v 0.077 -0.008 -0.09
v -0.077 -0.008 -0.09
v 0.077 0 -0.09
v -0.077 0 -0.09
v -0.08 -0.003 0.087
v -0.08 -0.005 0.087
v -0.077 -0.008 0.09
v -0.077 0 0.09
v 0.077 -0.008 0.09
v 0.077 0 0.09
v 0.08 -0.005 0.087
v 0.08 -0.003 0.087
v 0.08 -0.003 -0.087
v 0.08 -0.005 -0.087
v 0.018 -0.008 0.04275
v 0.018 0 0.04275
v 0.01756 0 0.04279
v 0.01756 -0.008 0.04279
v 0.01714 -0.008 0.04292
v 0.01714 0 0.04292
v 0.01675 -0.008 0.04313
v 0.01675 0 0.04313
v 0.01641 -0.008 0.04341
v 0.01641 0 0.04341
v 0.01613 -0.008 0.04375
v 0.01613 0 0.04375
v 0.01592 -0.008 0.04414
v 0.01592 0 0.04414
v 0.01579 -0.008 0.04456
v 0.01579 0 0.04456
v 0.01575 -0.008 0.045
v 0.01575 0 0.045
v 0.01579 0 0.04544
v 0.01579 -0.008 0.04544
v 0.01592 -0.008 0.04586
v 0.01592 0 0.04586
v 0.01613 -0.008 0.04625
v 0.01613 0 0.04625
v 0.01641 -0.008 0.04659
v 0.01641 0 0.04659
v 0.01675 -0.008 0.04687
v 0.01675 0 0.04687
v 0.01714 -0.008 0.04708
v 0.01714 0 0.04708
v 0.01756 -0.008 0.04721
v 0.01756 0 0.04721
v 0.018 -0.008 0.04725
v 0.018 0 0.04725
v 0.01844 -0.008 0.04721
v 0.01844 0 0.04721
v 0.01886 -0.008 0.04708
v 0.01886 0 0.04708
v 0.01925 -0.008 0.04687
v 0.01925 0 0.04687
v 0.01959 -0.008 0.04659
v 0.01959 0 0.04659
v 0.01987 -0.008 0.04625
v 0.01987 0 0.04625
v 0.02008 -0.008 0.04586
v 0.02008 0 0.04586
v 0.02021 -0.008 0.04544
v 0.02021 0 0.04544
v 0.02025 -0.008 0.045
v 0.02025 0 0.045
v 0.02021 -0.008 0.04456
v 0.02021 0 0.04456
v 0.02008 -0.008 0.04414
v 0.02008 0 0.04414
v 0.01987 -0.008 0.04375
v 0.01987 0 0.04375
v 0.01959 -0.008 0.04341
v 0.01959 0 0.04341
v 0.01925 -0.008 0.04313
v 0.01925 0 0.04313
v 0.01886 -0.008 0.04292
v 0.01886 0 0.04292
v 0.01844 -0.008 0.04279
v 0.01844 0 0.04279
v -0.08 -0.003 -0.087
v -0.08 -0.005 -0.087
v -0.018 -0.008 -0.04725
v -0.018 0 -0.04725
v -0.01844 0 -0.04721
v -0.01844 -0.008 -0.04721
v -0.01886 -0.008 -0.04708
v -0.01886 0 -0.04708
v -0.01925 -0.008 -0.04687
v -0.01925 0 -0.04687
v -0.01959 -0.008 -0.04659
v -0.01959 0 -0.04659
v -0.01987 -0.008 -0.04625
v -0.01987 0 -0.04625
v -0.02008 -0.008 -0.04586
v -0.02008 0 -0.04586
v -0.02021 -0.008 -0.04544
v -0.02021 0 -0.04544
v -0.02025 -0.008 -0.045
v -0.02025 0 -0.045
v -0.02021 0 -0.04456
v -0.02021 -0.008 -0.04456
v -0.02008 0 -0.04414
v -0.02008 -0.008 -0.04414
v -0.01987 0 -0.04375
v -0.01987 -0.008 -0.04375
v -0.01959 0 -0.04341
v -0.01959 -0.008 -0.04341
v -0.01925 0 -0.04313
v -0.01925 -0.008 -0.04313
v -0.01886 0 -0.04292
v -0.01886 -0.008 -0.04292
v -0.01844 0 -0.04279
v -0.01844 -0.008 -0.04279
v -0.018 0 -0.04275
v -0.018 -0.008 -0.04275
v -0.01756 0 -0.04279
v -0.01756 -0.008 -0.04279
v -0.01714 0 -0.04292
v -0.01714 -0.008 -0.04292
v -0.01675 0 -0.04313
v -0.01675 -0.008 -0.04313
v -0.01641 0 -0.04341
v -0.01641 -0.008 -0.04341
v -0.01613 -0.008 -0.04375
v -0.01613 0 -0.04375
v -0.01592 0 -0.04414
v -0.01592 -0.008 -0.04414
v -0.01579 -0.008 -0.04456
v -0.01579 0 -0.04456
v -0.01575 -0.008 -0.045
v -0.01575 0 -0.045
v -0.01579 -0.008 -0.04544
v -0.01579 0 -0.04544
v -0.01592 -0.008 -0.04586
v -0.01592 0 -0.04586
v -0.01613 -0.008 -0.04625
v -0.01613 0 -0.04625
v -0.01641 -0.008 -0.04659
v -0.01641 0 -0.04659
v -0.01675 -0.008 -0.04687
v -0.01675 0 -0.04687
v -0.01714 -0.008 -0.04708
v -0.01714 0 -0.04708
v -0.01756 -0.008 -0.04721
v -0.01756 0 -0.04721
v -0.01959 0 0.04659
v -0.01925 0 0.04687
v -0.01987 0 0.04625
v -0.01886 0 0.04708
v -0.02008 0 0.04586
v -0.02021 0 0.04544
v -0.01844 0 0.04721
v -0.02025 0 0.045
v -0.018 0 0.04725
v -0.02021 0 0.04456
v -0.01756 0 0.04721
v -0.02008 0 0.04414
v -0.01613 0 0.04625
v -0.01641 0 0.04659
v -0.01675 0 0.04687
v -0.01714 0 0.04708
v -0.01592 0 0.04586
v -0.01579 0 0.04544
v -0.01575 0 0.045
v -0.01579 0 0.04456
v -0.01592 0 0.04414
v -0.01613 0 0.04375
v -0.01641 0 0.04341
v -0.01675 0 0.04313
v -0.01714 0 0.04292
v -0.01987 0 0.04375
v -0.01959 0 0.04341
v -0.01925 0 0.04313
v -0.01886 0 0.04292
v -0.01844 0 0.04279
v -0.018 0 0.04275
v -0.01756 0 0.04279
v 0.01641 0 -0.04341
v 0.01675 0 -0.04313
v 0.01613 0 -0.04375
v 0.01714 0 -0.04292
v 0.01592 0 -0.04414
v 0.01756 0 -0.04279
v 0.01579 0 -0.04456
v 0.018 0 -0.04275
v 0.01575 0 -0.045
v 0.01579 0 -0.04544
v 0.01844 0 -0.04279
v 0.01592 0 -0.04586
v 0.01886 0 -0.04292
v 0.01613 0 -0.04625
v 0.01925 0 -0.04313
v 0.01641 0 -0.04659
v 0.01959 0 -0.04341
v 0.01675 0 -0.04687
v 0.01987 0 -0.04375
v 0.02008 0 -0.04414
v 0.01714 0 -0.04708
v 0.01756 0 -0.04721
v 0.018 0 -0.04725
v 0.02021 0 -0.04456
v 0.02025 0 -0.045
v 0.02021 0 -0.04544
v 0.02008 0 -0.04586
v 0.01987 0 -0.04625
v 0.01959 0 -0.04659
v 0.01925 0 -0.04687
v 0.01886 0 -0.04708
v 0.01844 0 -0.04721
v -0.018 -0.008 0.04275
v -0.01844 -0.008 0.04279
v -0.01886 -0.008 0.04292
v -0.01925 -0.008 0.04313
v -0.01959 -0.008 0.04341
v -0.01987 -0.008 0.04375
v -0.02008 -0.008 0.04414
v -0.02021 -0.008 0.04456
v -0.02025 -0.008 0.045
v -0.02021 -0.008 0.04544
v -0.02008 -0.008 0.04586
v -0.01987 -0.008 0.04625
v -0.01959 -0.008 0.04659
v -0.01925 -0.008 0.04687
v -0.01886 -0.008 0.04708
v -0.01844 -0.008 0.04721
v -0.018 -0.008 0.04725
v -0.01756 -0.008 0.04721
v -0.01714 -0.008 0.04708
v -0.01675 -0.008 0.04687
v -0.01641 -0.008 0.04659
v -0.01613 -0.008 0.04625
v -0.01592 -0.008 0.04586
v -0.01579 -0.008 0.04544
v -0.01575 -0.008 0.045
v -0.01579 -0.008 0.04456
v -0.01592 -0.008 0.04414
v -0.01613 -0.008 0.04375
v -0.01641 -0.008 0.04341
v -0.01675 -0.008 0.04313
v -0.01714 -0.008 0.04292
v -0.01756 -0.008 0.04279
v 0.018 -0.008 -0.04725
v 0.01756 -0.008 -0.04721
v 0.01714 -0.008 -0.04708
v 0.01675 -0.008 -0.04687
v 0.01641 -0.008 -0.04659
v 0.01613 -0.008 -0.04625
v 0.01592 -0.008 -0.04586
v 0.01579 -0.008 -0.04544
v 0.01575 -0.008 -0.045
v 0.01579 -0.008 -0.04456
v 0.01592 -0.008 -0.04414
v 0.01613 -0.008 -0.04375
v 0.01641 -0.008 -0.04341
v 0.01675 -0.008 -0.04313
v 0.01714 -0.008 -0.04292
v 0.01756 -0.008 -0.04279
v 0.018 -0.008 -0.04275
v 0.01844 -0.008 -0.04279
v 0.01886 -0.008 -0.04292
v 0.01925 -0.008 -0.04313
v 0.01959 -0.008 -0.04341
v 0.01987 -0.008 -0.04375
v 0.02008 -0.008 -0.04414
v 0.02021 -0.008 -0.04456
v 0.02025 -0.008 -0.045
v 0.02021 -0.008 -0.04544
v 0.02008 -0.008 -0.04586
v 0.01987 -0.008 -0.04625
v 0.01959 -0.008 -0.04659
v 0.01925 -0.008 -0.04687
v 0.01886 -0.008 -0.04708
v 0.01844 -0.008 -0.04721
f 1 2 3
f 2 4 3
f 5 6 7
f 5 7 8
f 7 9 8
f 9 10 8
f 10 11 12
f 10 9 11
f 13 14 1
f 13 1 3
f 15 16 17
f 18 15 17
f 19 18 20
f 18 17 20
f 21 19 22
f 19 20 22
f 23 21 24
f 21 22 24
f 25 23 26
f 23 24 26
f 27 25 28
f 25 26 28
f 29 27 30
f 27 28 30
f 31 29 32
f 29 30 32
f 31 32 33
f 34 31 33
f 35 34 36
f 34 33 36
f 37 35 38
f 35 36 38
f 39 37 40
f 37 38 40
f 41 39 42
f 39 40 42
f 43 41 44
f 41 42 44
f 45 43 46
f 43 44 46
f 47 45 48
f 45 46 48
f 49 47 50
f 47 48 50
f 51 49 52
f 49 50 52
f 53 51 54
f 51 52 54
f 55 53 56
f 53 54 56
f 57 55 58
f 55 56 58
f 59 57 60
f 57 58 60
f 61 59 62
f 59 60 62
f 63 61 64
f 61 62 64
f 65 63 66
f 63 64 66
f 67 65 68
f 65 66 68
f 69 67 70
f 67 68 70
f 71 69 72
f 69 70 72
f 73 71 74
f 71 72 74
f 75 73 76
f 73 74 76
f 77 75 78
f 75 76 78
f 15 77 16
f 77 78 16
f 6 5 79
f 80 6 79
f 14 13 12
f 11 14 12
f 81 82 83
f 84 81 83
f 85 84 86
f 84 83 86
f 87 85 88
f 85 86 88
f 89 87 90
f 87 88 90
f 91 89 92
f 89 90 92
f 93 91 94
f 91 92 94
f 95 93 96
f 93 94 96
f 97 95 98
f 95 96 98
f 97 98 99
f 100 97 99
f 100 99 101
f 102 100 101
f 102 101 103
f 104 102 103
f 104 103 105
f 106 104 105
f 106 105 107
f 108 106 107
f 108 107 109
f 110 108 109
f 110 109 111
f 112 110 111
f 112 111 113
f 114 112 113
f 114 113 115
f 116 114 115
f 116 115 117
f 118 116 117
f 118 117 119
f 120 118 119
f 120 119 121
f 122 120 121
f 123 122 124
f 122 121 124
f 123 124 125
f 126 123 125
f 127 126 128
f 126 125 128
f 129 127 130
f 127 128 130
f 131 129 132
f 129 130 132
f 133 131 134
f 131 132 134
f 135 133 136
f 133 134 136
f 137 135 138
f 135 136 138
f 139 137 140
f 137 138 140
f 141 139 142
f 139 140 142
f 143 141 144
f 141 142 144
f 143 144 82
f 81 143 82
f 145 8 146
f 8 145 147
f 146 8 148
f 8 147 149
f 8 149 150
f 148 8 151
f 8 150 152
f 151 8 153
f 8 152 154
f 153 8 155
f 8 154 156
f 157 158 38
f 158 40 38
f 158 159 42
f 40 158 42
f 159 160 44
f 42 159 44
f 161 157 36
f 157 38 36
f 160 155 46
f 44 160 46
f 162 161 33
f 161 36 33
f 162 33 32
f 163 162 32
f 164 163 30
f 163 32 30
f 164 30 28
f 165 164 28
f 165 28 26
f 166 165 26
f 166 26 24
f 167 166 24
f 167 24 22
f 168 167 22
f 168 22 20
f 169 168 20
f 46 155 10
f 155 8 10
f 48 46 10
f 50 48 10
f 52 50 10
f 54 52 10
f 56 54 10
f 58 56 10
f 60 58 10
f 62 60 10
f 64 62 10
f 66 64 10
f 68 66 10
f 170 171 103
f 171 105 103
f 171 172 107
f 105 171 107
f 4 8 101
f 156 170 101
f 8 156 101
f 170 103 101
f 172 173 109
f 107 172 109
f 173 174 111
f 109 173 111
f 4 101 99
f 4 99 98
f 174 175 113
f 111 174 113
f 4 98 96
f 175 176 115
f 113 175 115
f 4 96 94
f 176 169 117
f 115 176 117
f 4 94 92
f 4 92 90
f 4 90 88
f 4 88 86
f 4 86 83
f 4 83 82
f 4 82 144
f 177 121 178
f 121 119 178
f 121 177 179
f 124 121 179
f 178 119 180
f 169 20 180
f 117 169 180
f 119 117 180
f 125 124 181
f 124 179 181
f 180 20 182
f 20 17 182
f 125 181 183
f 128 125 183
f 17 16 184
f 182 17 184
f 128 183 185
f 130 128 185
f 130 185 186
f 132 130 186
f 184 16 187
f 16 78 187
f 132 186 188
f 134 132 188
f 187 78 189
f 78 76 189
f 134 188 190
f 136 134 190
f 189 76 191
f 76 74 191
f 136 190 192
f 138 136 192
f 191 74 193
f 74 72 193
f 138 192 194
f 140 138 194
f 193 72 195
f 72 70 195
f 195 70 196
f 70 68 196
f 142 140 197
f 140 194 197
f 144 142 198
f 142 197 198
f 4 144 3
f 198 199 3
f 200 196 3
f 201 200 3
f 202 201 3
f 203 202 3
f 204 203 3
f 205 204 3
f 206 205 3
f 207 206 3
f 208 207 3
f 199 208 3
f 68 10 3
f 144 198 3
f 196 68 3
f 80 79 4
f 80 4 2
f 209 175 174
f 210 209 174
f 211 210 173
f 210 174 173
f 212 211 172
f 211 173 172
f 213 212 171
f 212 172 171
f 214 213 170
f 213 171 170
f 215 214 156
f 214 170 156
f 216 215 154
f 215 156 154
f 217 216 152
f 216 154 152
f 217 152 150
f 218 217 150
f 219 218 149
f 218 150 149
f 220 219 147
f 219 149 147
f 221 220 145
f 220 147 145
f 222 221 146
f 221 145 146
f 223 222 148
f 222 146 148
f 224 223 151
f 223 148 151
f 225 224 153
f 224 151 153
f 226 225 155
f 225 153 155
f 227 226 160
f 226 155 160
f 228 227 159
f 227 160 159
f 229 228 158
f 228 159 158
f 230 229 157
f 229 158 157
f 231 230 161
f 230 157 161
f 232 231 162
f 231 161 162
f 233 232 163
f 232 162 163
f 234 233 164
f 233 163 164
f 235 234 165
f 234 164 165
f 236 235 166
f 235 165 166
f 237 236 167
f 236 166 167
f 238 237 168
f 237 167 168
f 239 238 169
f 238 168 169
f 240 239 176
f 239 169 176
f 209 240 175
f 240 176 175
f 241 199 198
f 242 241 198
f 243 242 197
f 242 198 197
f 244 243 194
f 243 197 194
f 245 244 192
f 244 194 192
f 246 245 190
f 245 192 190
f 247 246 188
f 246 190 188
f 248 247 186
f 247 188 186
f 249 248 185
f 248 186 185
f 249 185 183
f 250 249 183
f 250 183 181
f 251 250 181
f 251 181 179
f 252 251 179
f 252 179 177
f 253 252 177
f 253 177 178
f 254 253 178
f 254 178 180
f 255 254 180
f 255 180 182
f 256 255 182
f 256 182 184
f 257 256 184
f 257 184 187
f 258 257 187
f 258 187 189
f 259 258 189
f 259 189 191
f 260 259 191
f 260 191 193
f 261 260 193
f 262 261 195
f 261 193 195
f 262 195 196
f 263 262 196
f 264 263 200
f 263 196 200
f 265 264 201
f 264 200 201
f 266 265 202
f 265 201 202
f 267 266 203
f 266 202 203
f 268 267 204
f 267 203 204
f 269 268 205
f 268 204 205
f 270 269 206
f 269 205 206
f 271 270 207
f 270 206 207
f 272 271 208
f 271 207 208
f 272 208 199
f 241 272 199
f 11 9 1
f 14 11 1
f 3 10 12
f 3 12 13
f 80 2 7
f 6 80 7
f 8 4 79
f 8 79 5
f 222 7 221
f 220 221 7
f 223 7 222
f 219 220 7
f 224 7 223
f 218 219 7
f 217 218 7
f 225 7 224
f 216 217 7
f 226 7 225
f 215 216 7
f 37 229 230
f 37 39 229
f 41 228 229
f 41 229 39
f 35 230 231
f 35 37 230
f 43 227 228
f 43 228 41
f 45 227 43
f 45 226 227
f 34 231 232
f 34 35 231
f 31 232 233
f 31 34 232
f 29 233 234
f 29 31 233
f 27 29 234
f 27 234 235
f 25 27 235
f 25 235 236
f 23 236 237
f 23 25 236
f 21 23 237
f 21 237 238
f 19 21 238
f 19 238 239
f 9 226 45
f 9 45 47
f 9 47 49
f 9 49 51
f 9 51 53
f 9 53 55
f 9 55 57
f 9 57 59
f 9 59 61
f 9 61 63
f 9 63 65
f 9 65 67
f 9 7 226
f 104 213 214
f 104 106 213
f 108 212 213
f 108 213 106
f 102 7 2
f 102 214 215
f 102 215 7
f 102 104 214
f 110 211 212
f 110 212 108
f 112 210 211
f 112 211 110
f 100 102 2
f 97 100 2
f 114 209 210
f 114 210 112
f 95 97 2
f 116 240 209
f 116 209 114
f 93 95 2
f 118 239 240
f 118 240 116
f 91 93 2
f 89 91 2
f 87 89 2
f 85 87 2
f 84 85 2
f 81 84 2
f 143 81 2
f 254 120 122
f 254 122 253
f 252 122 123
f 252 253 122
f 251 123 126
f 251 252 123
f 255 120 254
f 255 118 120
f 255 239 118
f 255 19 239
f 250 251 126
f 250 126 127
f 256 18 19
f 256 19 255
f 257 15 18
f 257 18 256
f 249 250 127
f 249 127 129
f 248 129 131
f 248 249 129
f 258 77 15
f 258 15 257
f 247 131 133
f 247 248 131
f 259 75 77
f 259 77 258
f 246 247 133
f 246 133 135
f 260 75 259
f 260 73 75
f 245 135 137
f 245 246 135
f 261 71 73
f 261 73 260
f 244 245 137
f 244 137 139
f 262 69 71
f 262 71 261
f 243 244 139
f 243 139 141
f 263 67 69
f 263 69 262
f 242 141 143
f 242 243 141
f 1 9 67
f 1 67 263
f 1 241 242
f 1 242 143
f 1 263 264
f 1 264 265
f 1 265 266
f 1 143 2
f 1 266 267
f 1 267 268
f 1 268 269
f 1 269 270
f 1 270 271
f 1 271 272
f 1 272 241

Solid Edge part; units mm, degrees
sketch "Sketch1" plane through (0, 0, 0) normal (0, -1, 0) x (1, 0, 0)
  line L0 (-0.08, -0.09) -> (0.08, -0.09)
  line L1 (0.08, -0.09) -> (0.08, 0.09)
  line L2 (0.08, 0.09) -> (-0.08, 0.09)
  line L3 (-0.08, 0.09) -> (-0.08, -0.09)
  dimension "D1" = 0.16
  dimension "D2" = 0.18
extrude "Protrusion1" add sketch "Sketch1" along normal blind 0.008
chamfer "Fase_1" distance 0.003 angle 45 8 edges at (0.08, -0.008, 0) (0.08, 0, 0) (0.08, -0.004, 0.09) (0.08, -0.004, -0.09) (-0.08, -0.008, 0) (-0.08, 0, 0) (-0.08, -0.004, 0.09) (-0.08, -0.004, -0.09)
hole "Bohrung_1" at (0.018, -0.008, 0.045) direction (0, 1, 0) diameter 0.0045 depth 3.175
hole "Hole1" at (0.018, -0.008, -0.045) direction (0, 1, 0) diameter 0.0045 depth 3.175
hole "Hole2" at (-0.018, -0.008, -0.045) direction (0, 1, 0) diameter 0.0045 depth 3.175
hole "Hole3" at (-0.018, -0.008, 0.045) direction (0, 1, 0) diameter 0.0045 depth 3.175
